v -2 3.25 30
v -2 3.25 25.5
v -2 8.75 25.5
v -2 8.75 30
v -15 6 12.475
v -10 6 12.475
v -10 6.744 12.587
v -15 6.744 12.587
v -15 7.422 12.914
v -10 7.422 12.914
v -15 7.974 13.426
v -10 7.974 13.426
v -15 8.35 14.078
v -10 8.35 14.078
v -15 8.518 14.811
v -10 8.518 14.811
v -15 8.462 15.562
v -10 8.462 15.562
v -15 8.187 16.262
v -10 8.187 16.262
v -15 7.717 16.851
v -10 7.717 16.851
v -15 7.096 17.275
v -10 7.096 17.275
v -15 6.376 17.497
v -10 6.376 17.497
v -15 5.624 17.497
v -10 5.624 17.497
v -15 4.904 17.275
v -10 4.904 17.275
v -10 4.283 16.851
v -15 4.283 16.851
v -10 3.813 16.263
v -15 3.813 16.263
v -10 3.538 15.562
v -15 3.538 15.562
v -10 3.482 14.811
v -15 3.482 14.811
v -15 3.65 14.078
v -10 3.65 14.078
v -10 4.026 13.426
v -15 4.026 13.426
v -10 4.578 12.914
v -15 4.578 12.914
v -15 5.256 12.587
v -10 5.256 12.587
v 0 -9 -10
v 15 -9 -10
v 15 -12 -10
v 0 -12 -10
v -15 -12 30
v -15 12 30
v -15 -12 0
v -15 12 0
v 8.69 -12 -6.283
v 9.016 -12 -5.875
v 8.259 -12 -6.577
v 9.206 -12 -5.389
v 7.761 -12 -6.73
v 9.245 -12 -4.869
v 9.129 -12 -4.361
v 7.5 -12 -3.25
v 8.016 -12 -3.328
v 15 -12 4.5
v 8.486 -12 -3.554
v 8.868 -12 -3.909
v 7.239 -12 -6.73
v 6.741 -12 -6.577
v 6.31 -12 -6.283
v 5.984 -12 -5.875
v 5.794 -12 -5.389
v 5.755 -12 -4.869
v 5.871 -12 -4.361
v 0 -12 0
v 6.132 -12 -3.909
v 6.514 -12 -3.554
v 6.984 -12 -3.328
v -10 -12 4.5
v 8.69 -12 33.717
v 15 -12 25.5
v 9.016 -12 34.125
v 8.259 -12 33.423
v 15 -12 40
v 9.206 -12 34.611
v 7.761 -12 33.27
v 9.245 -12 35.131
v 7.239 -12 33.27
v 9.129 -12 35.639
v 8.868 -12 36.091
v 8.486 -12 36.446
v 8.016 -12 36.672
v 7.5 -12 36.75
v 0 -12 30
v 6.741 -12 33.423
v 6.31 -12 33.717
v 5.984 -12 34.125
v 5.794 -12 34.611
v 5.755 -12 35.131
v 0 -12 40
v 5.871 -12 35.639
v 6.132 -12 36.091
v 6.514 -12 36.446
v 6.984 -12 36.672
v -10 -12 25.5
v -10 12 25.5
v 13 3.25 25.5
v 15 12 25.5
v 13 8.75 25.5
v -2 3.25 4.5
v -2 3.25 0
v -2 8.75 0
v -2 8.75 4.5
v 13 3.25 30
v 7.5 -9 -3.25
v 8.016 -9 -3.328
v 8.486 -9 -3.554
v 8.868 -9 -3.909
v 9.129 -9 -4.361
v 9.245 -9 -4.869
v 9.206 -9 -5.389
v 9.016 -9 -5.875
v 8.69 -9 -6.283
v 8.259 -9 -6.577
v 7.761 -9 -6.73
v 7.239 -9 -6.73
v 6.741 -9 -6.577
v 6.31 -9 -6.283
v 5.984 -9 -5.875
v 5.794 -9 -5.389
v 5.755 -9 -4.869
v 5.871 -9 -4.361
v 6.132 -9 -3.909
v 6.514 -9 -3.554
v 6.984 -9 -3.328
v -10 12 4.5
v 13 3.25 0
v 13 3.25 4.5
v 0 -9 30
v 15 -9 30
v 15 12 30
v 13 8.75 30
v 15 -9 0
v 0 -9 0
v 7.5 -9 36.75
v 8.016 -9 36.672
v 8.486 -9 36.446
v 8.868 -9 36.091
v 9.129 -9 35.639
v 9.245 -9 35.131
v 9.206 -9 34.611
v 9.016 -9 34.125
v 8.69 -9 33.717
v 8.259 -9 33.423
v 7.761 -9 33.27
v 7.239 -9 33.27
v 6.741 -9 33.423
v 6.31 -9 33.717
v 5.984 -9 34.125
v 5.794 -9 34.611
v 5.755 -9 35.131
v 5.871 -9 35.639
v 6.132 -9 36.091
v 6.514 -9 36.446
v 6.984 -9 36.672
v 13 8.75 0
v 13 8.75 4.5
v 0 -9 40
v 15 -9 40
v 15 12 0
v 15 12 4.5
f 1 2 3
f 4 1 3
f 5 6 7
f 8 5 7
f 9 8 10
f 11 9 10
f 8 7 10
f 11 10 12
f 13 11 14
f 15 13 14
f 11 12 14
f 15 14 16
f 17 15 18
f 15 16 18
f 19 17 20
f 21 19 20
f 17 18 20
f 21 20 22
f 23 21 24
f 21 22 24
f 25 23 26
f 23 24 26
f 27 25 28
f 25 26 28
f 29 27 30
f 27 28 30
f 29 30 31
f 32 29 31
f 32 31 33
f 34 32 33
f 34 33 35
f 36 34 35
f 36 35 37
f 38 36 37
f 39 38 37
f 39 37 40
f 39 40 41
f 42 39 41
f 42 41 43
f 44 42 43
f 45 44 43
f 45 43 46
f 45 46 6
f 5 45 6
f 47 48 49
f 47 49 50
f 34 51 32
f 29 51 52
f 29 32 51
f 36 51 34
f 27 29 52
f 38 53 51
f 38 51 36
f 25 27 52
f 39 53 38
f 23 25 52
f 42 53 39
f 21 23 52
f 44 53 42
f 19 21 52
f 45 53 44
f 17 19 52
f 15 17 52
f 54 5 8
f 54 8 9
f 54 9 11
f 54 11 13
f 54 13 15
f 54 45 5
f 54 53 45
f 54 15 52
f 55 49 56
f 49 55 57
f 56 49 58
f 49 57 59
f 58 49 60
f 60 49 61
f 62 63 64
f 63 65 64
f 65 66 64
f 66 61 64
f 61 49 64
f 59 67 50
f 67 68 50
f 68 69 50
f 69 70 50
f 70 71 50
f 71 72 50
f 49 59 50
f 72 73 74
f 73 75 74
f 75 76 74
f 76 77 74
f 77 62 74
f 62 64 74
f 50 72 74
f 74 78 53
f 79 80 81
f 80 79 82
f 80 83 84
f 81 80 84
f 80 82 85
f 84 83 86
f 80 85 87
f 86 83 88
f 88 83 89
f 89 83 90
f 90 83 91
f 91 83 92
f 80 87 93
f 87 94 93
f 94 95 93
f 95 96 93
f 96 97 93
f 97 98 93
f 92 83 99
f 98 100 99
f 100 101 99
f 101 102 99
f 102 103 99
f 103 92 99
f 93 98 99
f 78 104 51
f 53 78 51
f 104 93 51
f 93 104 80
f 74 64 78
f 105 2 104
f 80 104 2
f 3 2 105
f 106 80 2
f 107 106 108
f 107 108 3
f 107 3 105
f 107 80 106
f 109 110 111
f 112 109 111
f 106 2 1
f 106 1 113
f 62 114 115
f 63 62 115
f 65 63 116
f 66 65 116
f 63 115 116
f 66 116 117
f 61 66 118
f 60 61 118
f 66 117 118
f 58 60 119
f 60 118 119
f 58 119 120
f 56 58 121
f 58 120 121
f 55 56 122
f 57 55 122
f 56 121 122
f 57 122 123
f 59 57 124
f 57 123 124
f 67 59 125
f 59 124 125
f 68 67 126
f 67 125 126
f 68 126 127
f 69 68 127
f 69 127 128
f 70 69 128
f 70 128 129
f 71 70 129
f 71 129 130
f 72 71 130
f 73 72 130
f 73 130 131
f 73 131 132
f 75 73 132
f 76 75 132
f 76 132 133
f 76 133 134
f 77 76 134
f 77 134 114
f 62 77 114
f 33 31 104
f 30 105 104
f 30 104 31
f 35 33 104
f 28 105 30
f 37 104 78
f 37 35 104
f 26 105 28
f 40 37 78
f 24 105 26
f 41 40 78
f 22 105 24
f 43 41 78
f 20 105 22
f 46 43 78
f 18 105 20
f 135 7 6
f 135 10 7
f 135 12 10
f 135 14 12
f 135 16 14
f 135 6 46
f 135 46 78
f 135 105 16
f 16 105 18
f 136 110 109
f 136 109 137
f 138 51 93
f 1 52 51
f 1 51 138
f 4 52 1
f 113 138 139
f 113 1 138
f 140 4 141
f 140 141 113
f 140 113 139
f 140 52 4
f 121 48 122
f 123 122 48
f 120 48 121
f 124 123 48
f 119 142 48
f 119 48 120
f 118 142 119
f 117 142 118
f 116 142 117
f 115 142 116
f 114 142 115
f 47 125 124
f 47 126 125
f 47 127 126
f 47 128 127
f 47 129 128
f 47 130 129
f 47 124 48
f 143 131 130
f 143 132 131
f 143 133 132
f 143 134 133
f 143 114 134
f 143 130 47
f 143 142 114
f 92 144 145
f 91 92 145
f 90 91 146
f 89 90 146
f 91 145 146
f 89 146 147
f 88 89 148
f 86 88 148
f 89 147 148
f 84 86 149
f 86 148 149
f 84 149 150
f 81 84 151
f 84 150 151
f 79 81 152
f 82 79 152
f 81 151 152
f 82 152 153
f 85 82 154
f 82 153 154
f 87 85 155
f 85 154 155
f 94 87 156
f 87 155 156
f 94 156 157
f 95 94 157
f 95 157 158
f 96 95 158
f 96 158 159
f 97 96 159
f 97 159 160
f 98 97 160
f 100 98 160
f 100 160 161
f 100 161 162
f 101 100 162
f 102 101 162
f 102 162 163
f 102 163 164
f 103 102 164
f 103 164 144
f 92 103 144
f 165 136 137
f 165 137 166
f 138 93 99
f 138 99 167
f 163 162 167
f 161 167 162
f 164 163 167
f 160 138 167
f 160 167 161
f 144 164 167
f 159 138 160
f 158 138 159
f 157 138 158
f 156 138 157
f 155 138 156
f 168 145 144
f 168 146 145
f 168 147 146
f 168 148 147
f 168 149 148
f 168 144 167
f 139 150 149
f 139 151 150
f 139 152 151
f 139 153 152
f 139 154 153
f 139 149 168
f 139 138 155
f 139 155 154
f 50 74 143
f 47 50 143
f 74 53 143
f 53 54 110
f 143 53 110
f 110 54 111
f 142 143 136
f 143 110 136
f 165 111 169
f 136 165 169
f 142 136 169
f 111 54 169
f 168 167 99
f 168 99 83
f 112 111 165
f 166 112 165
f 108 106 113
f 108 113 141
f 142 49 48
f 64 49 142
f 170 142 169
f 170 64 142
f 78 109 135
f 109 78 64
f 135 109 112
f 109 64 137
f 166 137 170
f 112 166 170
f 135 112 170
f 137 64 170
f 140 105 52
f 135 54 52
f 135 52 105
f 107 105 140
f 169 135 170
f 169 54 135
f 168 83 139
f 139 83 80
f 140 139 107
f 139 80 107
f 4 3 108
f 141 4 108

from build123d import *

# Parameters (mm, degrees)
SKETCH1_W           = 30
SKETCH1_H           = 24
SKETCH1_W_2         = 15
SKETCH1_H_2         = 5.5
BOSS_EXTRUDE1_DEPTH = 30
SKETCH2_W           = 21
SKETCH2_H           = 24
CUT_EXTRUDE1_DEPTH  = 25
SKETCH3_R           = 2.525
CUT_EXTRUDE2_DEPTH  = 41.853396432
SKETCH_1_W          = 15
SKETCH_1_H          = 3
EXTRUDE_1_DEPTH     = 10
SKETCH_2_W          = 15
SKETCH_2_H          = 3
EXTRUDE_2_DEPTH     = 10
SKETCH_3_R          = 1.75
CUT_EXTRUDE_1_DEPTH = 48.602520942
SKETCH_4_R          = 1.75
CUT_EXTRUDE_2_DEPTH = 48.602520942


with BuildPart() as part:
    # Sketch1 → Boss-Extrude1 (new body)
    with BuildSketch(Plane.XY):
        Rectangle(SKETCH1_W, SKETCH1_H)
        with Locations((5.5, 6)):
            Rectangle(SKETCH1_W_2, SKETCH1_H_2, mode=Mode.SUBTRACT)
    extrude(amount=BOSS_EXTRUDE1_DEPTH)

    # Sketch2 → Cut-Extrude1 (cut)
    with BuildSketch(Plane(origin=(15, 0, 0), x_dir=(0, 0, -1), z_dir=(1, 0, 0))):
        with Locations((-15, 0)):
            Rectangle(SKETCH2_W, SKETCH2_H)
    extrude(amount=-CUT_EXTRUDE1_DEPTH, mode=Mode.SUBTRACT)

    # Sketch3 → Cut-Extrude2 (cut, through all)
    with BuildSketch(Plane(origin=(-10, 0, 0), x_dir=(0, 0, -1), z_dir=(1, 0, 0))):
        with Locations((-15, 6)):
            Circle(SKETCH3_R)
    extrude(amount=-CUT_EXTRUDE2_DEPTH, mode=Mode.SUBTRACT)

    # Эскиз1 → Бобышка-Вытянуть1 (add)
    with BuildSketch(Plane.XY.offset(30)):
        with Locations((7.5, -10.5)):
            Rectangle(SKETCH_1_W, SKETCH_1_H)
    extrude(amount=EXTRUDE_1_DEPTH)

    # Эскиз2 → Бобышка-Вытянуть2 (add)
    with BuildSketch(Plane(origin=(0, 0, 0), x_dir=(-1, 0, 0), z_dir=(0, 0, -1))):
        with Locations((-7.5, -10.5)):
            Rectangle(SKETCH_2_W, SKETCH_2_H)
    extrude(amount=EXTRUDE_2_DEPTH)

    # Эскиз3 → Вырез-Вытянуть1 (cut, through all)
    with BuildSketch(Plane(origin=(0, -9, 0), x_dir=(1, 0, 0), z_dir=(0, 1, 0))):
        with Locations(Location((7.5, -35, 0), (0, 0, 270))):
            Circle(SKETCH_3_R)
    extrude(amount=-CUT_EXTRUDE_1_DEPTH, mode=Mode.SUBTRACT)

    # Эскиз4 → Вырез-Вытянуть2 (cut, through all)
    with BuildSketch(Plane(origin=(0, -9, 0), x_dir=(1, 0, 0), z_dir=(0, 1, 0))):
        with Locations(Location((7.5, 5, 0), (0, 0, 270))):
            Circle(SKETCH_4_R)
    extrude(amount=-CUT_EXTRUDE_2_DEPTH, mode=Mode.SUBTRACT)


solid = part.part
